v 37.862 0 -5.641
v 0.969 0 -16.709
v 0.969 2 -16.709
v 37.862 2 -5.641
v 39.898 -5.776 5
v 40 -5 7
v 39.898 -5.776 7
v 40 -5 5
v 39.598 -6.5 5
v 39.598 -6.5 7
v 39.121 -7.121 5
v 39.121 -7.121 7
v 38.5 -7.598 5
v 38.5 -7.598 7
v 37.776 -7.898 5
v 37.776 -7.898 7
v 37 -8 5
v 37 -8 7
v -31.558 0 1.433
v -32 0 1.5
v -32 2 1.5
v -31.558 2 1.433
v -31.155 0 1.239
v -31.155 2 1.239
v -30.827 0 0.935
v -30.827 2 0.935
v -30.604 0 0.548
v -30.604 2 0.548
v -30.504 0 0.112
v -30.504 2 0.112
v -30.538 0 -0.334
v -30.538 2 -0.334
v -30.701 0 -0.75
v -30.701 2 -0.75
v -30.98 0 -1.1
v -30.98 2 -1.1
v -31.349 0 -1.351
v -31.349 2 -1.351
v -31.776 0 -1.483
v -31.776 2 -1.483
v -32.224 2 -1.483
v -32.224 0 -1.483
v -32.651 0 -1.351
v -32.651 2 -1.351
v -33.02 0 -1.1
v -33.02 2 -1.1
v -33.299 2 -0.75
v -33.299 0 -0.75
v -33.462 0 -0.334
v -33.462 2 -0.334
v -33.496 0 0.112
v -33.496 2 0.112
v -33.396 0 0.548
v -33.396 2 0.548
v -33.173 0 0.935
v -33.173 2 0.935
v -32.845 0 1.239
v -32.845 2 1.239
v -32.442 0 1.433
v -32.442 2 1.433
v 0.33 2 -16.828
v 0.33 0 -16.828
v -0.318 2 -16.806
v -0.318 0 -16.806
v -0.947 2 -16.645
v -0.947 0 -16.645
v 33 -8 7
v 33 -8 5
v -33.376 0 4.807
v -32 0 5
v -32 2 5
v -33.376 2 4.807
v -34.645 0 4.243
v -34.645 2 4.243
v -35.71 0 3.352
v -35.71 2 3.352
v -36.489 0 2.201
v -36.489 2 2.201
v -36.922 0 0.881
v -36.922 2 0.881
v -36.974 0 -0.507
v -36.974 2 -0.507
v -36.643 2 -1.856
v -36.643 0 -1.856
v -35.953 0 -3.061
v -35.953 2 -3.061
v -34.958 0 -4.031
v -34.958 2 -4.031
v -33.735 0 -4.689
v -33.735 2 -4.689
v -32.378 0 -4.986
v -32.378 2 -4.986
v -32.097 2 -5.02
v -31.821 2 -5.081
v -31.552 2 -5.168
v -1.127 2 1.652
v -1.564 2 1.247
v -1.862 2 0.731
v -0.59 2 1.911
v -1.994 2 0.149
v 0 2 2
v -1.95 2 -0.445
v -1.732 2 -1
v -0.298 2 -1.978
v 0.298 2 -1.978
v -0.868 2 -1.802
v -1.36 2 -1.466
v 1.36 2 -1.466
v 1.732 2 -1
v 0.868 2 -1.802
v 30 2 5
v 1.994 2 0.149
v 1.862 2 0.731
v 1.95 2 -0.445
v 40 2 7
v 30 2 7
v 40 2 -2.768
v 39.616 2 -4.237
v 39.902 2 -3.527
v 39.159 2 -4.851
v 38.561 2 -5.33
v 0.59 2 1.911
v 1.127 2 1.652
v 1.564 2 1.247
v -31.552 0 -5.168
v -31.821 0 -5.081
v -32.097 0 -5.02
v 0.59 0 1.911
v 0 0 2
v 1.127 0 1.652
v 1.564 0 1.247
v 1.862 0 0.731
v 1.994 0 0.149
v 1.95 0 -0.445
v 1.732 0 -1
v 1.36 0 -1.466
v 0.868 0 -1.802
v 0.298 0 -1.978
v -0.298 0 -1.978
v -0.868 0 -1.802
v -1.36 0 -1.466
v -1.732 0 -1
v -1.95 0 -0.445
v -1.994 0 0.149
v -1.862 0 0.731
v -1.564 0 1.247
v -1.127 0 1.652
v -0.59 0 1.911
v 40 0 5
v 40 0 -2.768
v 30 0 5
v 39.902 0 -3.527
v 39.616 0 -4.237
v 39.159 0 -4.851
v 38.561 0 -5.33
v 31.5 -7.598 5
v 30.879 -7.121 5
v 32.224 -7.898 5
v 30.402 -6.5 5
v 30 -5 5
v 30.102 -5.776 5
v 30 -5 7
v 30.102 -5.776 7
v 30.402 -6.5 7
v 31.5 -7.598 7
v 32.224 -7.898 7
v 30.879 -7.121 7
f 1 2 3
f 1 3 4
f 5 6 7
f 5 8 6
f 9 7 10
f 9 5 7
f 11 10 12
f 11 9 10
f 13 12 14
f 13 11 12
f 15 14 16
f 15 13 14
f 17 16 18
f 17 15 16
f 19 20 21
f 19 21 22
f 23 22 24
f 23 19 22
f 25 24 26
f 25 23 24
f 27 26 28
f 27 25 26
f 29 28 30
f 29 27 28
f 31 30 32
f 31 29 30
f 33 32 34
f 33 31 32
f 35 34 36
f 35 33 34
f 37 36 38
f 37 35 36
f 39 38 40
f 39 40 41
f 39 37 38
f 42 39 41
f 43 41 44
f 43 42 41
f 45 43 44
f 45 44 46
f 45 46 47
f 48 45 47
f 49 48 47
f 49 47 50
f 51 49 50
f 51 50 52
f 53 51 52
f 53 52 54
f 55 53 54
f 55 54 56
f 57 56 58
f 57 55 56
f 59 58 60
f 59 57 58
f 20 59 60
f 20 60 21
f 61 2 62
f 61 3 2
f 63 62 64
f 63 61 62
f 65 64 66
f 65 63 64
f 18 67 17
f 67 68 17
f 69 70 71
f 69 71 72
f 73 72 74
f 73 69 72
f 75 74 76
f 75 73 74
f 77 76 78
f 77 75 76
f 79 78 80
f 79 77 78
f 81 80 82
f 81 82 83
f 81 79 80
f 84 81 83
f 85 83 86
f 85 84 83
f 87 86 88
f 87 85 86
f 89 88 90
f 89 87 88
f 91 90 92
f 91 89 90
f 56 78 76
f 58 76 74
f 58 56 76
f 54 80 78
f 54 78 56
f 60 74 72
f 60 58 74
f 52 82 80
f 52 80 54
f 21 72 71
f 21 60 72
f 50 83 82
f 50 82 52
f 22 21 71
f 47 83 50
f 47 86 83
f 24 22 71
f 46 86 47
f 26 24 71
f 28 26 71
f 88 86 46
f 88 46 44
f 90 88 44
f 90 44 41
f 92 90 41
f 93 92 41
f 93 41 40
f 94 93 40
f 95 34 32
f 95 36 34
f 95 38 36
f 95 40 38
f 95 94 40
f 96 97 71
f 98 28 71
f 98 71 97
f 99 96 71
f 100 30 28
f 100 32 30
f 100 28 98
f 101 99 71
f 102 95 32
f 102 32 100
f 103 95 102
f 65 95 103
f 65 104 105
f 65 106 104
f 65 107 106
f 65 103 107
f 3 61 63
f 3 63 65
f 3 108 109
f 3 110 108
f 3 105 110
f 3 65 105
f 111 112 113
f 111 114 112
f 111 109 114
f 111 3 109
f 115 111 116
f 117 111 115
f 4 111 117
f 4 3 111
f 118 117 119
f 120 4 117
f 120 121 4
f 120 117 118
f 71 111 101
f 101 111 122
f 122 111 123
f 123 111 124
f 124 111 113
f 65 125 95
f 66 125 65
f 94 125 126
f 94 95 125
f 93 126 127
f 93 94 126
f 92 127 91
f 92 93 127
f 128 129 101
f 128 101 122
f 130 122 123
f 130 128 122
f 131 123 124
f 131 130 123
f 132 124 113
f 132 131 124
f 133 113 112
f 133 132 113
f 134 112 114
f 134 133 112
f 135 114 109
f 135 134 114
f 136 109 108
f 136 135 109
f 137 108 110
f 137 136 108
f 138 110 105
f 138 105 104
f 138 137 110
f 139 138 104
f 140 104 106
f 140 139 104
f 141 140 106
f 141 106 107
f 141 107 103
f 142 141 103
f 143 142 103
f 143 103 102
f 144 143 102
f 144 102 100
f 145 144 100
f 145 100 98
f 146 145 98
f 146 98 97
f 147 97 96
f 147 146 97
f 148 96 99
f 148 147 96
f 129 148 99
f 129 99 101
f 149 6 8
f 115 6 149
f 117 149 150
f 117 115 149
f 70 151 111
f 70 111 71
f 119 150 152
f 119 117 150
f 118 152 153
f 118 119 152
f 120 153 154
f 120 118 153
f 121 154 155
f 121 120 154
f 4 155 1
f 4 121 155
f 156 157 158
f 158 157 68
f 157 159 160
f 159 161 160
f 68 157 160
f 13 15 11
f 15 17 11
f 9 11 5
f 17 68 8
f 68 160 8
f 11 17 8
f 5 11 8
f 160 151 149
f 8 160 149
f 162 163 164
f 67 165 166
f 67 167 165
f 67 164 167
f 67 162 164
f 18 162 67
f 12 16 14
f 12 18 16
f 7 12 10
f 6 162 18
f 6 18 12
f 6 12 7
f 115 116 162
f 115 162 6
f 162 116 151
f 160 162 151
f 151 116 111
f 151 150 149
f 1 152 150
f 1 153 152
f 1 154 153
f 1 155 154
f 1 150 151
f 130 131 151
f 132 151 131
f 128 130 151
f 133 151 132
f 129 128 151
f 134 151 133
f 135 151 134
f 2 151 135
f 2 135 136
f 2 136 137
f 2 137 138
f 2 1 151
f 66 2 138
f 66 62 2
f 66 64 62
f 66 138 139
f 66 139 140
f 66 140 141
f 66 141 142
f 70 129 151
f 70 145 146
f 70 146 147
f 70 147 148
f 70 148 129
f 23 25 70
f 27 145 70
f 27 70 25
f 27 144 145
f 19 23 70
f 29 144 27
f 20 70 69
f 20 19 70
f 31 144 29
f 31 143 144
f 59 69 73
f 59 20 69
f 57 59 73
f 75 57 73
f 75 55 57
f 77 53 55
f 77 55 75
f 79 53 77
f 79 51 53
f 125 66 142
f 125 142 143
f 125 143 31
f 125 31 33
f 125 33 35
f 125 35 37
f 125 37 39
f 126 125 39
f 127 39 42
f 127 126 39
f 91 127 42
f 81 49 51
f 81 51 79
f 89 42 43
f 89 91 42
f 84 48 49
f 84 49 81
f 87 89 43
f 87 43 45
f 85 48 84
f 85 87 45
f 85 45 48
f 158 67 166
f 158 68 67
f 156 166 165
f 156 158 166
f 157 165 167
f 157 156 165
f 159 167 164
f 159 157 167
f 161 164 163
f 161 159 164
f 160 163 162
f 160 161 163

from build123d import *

# Parameters (mm, degrees)
SKETCH_1_R      = 1.5
SKETCH_1_R_2    = 2
EXTRUDE_1_DEPTH = 2
SKETCH_2_W      = 10
SKETCH_2_H      = 2
EXTRUDE_2_DEPTH = 10
FILLET_1_R      = 3
FILLET_2_R      = 3


with BuildPart() as part:
    # 草图1 → 凸台-拉伸1 (new body)
    with BuildSketch(Plane(origin=(0, 0, 0), x_dir=(1, 0, 0), z_dir=(0, 1, 0))):
        with BuildLine():
            Line((-32, 5), (0, 17))
            Line((0, 17), (40, 5))
            Line((40, 5), (40, -5))
            Line((40, -5), (-32, -5))
            ThreePointArc((-32, -5), (-37, 0), (-32, 5))
        make_face()
        with Locations(Location((-32, 0, 0), (0, 0, 270))):
            Circle(SKETCH_1_R, mode=Mode.SUBTRACT)
        with Locations(Location((0, 0, 0), (0, 0, 270))):
            Circle(SKETCH_1_R_2, mode=Mode.SUBTRACT)
    extrude(amount=EXTRUDE_1_DEPTH)

    # 草图2 → 凸台-拉伸2 (add)
    with BuildSketch(Plane(origin=(0, 2, 0), x_dir=(1, 0, 0), z_dir=(0, 1, 0))):
        with Locations((35, -6)):
            Rectangle(SKETCH_2_W, SKETCH_2_H)
    extrude(amount=-EXTRUDE_2_DEPTH)

    # 圆角1
    fillet_1_edges = [part.edges().sort_by_distance(p)[0] for p in [
        (-32, 1, -5),
        (0, 1, -17),
        (40, 1, -5),
    ]]
    fillet(fillet_1_edges, radius=FILLET_1_R)

    # 圆角2
    fillet_2_edges = [part.edges().sort_by_distance(p)[0] for p in [
        (40, -8, 6),
        (30, -8, 6),
    ]]
    fillet(fillet_2_edges, radius=FILLET_2_R)


solid = part.part
